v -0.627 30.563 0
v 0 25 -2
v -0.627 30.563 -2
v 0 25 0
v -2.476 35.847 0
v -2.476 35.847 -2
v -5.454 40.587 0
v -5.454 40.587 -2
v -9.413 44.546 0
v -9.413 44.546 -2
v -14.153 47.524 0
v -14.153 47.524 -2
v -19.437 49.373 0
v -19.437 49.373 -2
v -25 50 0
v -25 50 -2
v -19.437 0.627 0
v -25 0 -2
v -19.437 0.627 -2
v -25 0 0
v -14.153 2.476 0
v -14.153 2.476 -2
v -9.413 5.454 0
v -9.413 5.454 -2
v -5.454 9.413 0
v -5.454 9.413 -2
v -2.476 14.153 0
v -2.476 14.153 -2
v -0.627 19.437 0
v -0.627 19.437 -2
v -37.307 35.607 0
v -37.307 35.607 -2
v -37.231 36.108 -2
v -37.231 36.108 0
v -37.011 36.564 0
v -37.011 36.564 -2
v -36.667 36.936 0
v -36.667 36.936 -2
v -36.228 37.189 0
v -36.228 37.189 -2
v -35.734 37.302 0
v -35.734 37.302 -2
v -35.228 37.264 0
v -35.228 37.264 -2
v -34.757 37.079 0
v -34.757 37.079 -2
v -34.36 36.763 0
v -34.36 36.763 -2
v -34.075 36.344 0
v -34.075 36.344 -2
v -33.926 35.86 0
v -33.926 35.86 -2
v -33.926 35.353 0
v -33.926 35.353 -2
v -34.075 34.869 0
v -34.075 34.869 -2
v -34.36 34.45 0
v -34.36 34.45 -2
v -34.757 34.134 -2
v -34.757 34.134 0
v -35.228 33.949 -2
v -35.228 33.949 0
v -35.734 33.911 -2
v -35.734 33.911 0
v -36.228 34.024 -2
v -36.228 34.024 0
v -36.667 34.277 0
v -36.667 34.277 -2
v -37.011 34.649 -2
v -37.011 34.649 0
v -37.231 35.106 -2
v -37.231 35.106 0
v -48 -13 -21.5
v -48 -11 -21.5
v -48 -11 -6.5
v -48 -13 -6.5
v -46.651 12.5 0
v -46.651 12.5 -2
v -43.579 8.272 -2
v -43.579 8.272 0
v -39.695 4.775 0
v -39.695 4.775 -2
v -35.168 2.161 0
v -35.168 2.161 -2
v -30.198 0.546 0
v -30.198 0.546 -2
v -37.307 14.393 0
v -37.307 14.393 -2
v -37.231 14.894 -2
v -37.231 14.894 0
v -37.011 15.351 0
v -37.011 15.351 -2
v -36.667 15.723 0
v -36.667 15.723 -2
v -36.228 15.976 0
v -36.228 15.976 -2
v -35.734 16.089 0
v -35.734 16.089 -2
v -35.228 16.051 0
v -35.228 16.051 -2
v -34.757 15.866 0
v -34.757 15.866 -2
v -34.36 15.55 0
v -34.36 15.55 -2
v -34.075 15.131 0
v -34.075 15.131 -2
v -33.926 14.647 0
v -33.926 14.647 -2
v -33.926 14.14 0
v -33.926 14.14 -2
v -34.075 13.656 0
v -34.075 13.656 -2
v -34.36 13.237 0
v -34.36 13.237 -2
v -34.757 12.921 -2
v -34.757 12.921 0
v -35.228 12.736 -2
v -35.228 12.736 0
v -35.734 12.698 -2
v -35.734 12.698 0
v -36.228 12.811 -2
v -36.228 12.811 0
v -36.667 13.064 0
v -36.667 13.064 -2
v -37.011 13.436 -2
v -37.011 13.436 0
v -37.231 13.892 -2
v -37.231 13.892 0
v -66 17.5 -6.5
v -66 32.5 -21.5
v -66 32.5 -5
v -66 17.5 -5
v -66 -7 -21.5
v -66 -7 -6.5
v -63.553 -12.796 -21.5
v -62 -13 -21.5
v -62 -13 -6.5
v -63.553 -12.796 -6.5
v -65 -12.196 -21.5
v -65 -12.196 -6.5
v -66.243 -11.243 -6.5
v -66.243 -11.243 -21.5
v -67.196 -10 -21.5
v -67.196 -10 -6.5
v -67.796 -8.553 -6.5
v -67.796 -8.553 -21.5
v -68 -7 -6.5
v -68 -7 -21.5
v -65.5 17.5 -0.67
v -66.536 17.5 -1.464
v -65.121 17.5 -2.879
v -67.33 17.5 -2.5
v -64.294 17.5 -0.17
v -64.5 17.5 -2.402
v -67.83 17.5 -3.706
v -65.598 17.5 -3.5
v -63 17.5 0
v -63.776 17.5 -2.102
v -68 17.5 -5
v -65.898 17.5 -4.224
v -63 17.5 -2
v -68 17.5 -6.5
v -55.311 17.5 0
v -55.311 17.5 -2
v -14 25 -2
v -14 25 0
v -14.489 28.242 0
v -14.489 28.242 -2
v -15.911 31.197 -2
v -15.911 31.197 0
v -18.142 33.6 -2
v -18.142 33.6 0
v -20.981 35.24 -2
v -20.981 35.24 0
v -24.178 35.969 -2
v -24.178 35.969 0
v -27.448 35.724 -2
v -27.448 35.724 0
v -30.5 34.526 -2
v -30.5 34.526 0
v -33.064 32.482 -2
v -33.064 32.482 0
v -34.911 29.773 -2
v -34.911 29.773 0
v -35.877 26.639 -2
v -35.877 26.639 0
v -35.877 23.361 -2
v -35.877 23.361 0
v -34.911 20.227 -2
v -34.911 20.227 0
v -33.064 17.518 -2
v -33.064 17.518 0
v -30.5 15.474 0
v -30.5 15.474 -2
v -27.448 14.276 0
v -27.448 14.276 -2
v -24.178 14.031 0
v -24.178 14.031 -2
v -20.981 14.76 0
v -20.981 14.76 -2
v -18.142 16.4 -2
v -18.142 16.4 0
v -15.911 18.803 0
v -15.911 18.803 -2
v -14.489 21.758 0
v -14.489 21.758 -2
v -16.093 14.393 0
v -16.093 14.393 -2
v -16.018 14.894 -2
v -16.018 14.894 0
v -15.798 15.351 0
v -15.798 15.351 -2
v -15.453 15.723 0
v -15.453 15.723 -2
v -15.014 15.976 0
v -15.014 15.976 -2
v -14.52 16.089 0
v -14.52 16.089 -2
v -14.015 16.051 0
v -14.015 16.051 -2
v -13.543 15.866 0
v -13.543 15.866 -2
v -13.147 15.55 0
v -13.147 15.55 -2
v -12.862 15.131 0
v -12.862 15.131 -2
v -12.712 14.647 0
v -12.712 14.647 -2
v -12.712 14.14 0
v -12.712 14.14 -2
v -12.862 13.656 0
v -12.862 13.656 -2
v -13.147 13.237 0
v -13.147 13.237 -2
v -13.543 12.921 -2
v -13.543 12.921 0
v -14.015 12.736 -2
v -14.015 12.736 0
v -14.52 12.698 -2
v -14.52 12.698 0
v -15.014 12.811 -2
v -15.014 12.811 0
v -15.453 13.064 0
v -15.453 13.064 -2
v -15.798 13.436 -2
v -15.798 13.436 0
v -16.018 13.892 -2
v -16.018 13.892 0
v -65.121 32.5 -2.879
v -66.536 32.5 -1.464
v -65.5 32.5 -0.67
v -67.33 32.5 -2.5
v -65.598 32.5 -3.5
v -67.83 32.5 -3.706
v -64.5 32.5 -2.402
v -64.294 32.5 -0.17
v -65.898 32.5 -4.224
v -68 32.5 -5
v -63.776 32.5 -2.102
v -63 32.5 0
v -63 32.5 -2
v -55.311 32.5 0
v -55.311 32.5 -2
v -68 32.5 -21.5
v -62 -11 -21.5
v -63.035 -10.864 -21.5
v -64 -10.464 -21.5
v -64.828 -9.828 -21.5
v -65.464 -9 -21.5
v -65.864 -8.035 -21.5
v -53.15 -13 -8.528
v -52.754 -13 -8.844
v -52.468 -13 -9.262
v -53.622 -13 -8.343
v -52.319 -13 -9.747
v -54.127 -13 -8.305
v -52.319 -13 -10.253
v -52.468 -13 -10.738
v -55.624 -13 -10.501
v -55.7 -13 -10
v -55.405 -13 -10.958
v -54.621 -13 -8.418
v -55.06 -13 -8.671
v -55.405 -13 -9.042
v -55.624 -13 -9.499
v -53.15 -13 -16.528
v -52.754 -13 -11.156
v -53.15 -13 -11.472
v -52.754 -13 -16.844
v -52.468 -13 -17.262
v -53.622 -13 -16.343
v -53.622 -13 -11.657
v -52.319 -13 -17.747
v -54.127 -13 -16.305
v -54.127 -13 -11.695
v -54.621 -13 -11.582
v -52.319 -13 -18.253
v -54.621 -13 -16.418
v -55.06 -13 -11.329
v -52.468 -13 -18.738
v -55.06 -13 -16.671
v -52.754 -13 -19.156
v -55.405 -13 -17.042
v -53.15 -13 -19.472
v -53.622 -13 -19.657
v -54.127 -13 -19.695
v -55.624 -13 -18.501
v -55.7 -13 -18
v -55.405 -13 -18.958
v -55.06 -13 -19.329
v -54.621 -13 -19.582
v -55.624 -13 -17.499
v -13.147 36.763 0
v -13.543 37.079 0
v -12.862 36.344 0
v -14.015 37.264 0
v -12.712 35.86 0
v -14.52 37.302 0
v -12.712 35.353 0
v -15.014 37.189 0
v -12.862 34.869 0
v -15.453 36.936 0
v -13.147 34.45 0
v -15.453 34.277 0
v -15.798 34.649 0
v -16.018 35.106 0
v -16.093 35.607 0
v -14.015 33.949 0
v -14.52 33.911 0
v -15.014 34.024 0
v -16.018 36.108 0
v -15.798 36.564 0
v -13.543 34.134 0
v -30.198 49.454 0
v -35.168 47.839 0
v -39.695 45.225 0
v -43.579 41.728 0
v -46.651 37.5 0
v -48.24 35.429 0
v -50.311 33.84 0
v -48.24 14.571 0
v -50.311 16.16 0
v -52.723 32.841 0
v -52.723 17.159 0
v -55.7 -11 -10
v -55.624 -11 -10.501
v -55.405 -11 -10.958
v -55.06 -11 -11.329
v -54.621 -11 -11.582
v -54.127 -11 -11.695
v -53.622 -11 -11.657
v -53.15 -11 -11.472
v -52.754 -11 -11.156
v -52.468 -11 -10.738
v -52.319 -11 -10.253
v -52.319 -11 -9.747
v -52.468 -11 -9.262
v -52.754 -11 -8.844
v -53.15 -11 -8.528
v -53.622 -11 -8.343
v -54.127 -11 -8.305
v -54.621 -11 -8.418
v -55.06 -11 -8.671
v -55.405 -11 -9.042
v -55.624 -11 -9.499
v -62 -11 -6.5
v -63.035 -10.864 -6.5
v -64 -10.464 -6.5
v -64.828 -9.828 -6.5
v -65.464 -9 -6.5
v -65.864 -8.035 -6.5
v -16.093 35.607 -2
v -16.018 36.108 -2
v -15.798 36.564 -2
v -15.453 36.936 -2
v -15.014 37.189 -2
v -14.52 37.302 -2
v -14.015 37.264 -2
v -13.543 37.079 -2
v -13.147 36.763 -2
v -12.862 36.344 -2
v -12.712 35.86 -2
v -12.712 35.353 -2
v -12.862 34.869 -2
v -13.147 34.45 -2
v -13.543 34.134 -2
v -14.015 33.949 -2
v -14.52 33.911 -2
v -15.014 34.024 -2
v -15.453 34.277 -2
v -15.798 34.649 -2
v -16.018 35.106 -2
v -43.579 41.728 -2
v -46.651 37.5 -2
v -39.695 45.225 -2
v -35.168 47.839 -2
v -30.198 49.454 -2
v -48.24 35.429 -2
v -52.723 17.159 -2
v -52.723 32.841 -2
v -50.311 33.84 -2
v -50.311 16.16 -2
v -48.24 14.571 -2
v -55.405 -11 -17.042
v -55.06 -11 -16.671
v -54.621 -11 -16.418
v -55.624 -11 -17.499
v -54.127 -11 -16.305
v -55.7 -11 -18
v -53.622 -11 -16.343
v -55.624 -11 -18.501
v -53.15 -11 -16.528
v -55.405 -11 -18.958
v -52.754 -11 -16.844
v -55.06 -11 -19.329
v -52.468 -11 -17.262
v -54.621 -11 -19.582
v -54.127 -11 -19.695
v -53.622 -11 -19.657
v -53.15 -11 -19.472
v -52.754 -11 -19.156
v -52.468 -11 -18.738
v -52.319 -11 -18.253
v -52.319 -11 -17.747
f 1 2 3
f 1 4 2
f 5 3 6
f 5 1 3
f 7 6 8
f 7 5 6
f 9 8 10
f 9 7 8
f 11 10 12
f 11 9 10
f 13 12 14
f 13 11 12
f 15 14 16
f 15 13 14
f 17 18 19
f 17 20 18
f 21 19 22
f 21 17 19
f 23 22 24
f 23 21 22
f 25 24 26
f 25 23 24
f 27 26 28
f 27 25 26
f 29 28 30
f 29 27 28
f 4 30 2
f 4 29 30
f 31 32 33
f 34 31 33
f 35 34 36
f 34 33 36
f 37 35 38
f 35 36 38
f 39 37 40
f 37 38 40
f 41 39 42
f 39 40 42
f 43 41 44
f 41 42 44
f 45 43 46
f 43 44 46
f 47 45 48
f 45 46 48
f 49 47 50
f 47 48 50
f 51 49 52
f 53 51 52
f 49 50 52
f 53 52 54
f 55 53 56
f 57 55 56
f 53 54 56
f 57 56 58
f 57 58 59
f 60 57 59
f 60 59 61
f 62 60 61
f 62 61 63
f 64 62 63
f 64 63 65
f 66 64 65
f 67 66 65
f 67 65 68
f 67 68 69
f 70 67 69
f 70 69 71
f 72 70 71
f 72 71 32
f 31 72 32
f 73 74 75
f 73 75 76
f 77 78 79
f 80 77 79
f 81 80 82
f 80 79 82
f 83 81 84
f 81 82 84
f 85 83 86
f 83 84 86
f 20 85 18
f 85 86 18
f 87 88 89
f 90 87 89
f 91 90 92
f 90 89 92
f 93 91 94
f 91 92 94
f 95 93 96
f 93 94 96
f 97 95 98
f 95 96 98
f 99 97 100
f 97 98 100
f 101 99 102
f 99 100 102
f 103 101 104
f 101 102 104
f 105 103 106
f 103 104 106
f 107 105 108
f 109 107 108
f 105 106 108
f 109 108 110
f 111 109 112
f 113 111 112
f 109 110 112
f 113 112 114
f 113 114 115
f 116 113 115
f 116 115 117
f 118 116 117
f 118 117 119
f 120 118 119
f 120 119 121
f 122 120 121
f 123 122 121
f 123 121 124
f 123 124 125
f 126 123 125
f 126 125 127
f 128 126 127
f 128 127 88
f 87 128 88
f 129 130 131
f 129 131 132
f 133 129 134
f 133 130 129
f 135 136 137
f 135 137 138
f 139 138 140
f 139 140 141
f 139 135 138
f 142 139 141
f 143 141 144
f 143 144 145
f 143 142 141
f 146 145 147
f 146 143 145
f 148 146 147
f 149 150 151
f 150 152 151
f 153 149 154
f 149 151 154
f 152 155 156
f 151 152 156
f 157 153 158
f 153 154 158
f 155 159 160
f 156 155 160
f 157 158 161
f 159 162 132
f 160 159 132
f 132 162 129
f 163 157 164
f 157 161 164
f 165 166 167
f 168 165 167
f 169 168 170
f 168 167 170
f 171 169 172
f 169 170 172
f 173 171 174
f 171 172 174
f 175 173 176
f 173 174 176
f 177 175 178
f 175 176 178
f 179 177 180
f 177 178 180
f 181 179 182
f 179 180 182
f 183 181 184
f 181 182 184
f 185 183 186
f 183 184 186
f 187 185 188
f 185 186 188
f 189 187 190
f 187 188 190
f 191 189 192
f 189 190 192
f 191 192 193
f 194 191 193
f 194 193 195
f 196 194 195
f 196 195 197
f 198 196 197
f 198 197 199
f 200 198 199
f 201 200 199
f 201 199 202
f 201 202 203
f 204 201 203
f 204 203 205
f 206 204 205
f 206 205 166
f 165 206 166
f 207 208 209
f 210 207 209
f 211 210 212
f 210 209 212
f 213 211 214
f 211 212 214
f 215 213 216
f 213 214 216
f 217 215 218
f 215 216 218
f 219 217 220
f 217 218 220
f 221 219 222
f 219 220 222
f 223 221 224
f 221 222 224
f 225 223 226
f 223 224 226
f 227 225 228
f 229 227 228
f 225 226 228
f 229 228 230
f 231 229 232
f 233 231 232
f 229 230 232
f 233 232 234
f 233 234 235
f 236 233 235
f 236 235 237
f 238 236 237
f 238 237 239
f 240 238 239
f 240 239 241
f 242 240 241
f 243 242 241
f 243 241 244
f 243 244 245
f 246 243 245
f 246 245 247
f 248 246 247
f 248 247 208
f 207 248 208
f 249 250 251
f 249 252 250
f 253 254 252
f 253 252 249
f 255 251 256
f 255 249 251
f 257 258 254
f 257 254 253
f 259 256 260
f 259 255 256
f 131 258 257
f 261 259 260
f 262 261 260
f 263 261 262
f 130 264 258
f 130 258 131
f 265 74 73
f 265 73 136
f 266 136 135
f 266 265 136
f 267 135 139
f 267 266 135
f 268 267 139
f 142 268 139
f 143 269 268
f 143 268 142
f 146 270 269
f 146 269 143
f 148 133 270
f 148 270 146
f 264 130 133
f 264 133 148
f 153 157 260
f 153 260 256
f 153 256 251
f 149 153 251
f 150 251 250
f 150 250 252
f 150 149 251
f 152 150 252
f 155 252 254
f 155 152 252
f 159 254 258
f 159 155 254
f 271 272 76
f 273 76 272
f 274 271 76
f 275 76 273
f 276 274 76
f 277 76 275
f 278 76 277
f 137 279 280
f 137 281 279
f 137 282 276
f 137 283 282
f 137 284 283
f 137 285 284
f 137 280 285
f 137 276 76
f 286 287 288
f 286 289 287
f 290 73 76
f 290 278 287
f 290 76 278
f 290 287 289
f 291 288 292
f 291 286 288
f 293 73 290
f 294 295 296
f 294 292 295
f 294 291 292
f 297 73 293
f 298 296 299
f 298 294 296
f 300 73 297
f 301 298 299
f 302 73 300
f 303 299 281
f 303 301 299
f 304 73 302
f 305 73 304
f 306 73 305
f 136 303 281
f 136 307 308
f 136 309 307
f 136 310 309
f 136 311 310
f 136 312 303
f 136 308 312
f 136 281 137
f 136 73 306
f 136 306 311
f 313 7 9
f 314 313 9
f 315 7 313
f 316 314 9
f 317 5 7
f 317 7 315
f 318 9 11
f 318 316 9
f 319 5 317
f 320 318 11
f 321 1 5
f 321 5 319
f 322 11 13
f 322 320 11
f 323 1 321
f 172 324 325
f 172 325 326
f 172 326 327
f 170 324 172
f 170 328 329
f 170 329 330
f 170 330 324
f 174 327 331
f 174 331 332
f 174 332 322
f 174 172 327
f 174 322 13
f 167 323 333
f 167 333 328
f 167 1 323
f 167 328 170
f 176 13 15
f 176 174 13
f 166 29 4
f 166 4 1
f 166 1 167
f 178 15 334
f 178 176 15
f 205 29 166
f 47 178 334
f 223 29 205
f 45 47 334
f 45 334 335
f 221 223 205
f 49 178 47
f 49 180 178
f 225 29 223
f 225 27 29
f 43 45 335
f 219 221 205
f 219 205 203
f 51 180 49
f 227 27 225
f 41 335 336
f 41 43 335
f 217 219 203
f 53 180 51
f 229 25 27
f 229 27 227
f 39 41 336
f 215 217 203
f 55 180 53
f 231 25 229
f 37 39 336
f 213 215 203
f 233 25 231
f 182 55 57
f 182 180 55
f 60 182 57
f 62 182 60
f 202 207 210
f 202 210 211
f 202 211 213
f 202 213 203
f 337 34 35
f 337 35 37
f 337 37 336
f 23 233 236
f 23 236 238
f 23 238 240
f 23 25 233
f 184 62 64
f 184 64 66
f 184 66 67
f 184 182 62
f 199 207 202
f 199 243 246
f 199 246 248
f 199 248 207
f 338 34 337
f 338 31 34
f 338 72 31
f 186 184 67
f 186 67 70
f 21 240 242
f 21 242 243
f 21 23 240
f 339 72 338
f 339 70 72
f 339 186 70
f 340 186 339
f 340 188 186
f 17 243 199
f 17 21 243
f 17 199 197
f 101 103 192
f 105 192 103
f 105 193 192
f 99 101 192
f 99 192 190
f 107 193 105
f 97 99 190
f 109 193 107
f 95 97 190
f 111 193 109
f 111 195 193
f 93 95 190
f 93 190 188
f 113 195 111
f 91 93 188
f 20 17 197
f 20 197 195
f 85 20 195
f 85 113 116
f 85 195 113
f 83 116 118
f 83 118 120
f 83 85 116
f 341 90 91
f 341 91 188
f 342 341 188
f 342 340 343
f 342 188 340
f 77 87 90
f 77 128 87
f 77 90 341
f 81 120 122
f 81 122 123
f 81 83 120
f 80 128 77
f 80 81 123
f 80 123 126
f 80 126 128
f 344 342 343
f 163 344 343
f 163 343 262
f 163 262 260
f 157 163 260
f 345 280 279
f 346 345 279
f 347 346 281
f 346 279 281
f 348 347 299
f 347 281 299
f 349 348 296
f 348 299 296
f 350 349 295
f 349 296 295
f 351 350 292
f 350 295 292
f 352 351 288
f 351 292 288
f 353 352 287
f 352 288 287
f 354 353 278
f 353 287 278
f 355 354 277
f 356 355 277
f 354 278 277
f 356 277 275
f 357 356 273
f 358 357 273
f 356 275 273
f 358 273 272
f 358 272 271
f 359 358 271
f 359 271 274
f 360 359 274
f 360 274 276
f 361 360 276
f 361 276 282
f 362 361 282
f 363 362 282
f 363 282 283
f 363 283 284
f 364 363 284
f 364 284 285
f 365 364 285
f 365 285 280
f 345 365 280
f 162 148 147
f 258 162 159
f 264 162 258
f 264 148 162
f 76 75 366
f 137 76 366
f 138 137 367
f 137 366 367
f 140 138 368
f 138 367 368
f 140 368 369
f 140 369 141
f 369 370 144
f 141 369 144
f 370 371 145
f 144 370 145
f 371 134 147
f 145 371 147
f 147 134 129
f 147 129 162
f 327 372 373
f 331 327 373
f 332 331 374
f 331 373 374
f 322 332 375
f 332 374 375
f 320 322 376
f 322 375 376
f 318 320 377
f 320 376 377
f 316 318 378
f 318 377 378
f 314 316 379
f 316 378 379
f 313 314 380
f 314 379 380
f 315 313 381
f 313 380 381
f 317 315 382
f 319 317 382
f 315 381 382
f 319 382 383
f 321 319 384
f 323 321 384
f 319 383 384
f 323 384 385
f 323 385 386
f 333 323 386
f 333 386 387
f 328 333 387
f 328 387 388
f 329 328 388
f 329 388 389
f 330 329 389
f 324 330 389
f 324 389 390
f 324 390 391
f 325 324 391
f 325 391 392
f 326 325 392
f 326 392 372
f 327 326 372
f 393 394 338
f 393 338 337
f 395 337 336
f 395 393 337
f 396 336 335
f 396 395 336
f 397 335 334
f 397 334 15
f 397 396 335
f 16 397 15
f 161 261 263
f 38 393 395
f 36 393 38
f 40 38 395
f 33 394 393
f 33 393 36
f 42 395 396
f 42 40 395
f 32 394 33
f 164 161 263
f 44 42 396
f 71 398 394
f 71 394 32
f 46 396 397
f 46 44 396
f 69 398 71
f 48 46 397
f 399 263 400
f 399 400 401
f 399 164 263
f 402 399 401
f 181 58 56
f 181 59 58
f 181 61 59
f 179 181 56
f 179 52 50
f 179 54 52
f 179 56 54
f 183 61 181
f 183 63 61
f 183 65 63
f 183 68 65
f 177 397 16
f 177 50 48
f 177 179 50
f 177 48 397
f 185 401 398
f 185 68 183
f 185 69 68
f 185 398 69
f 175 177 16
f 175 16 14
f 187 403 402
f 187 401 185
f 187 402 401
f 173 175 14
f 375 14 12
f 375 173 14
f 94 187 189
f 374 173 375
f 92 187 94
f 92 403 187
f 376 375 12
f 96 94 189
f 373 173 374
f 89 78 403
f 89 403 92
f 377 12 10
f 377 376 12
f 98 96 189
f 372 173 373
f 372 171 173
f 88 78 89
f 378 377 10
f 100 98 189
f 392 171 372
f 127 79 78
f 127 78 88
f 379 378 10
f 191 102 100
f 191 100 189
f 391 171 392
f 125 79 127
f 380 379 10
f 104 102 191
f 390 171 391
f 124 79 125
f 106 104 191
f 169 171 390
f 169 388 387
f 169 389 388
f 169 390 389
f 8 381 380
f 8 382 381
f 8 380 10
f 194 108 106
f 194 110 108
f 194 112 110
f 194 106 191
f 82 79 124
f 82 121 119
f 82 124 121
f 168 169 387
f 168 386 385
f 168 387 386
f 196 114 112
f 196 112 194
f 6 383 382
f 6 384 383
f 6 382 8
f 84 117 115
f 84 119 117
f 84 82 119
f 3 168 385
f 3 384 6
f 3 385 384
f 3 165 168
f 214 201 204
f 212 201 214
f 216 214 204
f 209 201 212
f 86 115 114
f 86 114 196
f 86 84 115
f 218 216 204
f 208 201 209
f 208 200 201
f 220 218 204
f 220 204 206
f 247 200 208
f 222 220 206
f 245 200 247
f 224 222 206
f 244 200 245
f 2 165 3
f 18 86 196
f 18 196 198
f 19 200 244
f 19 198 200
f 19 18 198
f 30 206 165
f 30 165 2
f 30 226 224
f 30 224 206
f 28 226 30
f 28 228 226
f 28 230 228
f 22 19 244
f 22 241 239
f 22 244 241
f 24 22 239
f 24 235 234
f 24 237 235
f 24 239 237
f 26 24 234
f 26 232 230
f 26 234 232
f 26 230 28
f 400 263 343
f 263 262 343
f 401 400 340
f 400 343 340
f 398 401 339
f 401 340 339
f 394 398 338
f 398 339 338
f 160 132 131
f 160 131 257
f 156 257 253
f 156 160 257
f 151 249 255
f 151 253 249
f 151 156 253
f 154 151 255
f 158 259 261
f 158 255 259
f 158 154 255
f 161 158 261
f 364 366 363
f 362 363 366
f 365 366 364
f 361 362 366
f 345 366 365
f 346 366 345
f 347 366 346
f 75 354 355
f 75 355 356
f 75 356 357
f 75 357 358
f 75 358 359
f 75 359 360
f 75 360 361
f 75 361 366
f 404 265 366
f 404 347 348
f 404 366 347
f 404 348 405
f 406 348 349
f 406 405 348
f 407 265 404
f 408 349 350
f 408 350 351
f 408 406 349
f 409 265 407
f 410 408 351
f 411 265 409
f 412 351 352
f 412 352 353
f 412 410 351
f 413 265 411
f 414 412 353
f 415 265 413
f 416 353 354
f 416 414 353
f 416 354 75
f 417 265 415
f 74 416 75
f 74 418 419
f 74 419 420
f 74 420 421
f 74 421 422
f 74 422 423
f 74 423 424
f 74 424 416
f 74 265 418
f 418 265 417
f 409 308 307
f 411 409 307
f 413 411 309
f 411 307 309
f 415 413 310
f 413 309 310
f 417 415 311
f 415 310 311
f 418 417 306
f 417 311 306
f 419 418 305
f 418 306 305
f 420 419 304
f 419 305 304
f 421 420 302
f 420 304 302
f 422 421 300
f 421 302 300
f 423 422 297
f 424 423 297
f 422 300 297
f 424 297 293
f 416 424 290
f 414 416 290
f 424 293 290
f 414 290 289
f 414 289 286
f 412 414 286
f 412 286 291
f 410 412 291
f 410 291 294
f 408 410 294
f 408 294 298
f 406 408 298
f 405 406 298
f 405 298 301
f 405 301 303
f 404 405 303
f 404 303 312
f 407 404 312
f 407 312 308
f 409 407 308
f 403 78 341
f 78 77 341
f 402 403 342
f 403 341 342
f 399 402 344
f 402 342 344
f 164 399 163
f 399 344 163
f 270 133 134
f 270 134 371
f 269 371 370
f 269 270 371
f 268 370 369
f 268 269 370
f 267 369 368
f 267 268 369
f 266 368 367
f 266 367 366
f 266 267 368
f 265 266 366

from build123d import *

# Parameters (mm, degrees)
BOSS_EXTRUDE1_DEPTH  = 50
SKETCH4_R            = 11
CUT_EXTRUDE1_DEPTH   = 88.099081511
BOSS_EXTRUDE2_DEPTH  = 15
M3_CLEARANCE_HOLE2_D = 3.4
CUT_EXTRUDE2_START   = -6.5
CUT_EXTRUDE2_DEPTH   = 6.5
CUT_EXTRUDE3_START   = -21.5
CUT_EXTRUDE3_DEPTH   = 21.5
FILLET1_R            = 25
FILLET2_R            = 10
CONVERT_SOLID1_START = -21.5
CONVERT_SOLID1_DEPTH = 15
M3_CLEARANCE_HOLE3_D = 3.4


# Read off the part's stored shape, not the designer's step: Convert-Solid1
with BuildPart() as part:
    # Sketch2 → Boss-Extrude1 (new body)
    with BuildSketch(Plane(origin=(0, 0, 0), x_dir=(1, 0, 0), z_dir=(0, 1, 0))):
        with BuildLine():
            Line((0, 0), (-63, 0))
            ThreePointArc((-63, 0), (-66.535533906, 1.464466094), (-68, 5))
            Line((-68, 5), (-68, 21.5))
            Line((-68, 21.5), (-66, 21.5))
            Line((-66, 21.5), (-66, 5))
            ThreePointArc((-66, 5), (-65.121320344, 2.878679656), (-63, 2))
            Line((-63, 2), (0, 2))
            Line((0, 2), (0, 0))
        make_face()
    extrude(amount=BOSS_EXTRUDE1_DEPTH)

    # Sketch4 → Cut-Extrude1 (cut, through all)
    with BuildSketch(Plane.XY):
        with Locations((-25, 25)):
            Circle(SKETCH4_R)
    extrude(amount=-CUT_EXTRUDE1_DEPTH, mode=Mode.SUBTRACT)

    # Sketch3 → Boss-Extrude2 (add)
    with BuildSketch(Plane(origin=(0, 0, -21.5), x_dir=(-1, 0, 0), z_dir=(0, 0, -1))):
        with BuildLine():
            Line((66, 0), (66, -7))
            ThreePointArc((66, -7), (64.828427125, -9.828427125), (62, -11))
            Line((62, -11), (48, -11))
            Line((48, -11), (48, -13))
            Line((48, -13), (63, -13))
            ThreePointArc((63, -13), (66.535533906, -11.535533906), (68, -8))
            Line((68, -8), (68, 0))
            Line((68, 0), (66, 0))
        make_face()
    extrude(amount=-BOSS_EXTRUDE2_DEPTH)

    # M3 Clearance Hole2 (through all)
    with Locations(Plane.XY):
        with Locations((-35.606601718, 14.393398282), (-35.606601718, 35.606601718), (-14.393398282, 35.606601718), (-14.393398282, 14.393398282)):
            Hole(M3_CLEARANCE_HOLE2_D / 2)

    # Sketch8 → Cut-Extrude2 (cut)
    with BuildSketch(Plane.XY.offset(CUT_EXTRUDE2_START)):
        with BuildLine():
            Line((-25, 0), (-68, 0))
            Line((-68, 0), (-68, 17.5))
            Line((-68, 17.5), (-48.848480035, 17.5))
            ThreePointArc((-48.848480035, 17.5), (-39.790199458, 4.844355629), (-25, 0))
        make_face()
    extrude(amount=CUT_EXTRUDE2_DEPTH, mode=Mode.SUBTRACT)

    # Sketch9 → Cut-Extrude3 (cut)
    with BuildSketch(Plane.XY.offset(CUT_EXTRUDE3_START)):
        with BuildLine():
            Line((-25, 50), (-68, 50))
            Line((-68, 50), (-68, 32.5))
            Line((-68, 32.5), (-48.848480035, 32.5))
            ThreePointArc((-48.848480035, 32.5), (-39.790199458, 45.155644371), (-25, 50))
        make_face()
    extrude(amount=CUT_EXTRUDE3_DEPTH, mode=Mode.SUBTRACT)

    # Fillet1
    fillet1_edges = [part.edges().sort_by_distance(p)[0] for p in [
        (0, 0, -1),
        (0, 50, -1),
    ]]
    fillet(fillet1_edges, radius=FILLET1_R - 0.0001)  # a hair under: the kernel refuses the full size

    # Fillet2
    fillet2_edges = [part.edges().sort_by_distance(p)[0] for p in [
        (-48.848480035, 32.5, -1),
        (-48.848480035, 17.5, -1),
    ]]
    fillet(fillet2_edges, radius=FILLET2_R)

    # Convert-Solid1 outline → Convert-Solid1 (cut)
    with BuildSketch(Plane.XY.offset(CONVERT_SOLID1_START)):
        with BuildLine():
            Line((-63, -13), (-62, -13))
            ThreePointArc((-62, -13), (-66.242640687, -11.242640687), (-68, -7))
            Line((-68, -7), (-68, -8))
            ThreePointArc((-68, -8), (-66.535533906, -11.535533906), (-63, -13))
        make_face()
    extrude(amount=CONVERT_SOLID1_DEPTH, mode=Mode.SUBTRACT)

    # M3 Clearance Hole3 (through all)
    with Locations(Plane(origin=(0, -11, 0), x_dir=(1, 0, 0), z_dir=(0, 1, 0))):
        with Locations((-54, 10), (-54, 18)):
            Hole(M3_CLEARANCE_HOLE3_D / 2)


solid = part.part
